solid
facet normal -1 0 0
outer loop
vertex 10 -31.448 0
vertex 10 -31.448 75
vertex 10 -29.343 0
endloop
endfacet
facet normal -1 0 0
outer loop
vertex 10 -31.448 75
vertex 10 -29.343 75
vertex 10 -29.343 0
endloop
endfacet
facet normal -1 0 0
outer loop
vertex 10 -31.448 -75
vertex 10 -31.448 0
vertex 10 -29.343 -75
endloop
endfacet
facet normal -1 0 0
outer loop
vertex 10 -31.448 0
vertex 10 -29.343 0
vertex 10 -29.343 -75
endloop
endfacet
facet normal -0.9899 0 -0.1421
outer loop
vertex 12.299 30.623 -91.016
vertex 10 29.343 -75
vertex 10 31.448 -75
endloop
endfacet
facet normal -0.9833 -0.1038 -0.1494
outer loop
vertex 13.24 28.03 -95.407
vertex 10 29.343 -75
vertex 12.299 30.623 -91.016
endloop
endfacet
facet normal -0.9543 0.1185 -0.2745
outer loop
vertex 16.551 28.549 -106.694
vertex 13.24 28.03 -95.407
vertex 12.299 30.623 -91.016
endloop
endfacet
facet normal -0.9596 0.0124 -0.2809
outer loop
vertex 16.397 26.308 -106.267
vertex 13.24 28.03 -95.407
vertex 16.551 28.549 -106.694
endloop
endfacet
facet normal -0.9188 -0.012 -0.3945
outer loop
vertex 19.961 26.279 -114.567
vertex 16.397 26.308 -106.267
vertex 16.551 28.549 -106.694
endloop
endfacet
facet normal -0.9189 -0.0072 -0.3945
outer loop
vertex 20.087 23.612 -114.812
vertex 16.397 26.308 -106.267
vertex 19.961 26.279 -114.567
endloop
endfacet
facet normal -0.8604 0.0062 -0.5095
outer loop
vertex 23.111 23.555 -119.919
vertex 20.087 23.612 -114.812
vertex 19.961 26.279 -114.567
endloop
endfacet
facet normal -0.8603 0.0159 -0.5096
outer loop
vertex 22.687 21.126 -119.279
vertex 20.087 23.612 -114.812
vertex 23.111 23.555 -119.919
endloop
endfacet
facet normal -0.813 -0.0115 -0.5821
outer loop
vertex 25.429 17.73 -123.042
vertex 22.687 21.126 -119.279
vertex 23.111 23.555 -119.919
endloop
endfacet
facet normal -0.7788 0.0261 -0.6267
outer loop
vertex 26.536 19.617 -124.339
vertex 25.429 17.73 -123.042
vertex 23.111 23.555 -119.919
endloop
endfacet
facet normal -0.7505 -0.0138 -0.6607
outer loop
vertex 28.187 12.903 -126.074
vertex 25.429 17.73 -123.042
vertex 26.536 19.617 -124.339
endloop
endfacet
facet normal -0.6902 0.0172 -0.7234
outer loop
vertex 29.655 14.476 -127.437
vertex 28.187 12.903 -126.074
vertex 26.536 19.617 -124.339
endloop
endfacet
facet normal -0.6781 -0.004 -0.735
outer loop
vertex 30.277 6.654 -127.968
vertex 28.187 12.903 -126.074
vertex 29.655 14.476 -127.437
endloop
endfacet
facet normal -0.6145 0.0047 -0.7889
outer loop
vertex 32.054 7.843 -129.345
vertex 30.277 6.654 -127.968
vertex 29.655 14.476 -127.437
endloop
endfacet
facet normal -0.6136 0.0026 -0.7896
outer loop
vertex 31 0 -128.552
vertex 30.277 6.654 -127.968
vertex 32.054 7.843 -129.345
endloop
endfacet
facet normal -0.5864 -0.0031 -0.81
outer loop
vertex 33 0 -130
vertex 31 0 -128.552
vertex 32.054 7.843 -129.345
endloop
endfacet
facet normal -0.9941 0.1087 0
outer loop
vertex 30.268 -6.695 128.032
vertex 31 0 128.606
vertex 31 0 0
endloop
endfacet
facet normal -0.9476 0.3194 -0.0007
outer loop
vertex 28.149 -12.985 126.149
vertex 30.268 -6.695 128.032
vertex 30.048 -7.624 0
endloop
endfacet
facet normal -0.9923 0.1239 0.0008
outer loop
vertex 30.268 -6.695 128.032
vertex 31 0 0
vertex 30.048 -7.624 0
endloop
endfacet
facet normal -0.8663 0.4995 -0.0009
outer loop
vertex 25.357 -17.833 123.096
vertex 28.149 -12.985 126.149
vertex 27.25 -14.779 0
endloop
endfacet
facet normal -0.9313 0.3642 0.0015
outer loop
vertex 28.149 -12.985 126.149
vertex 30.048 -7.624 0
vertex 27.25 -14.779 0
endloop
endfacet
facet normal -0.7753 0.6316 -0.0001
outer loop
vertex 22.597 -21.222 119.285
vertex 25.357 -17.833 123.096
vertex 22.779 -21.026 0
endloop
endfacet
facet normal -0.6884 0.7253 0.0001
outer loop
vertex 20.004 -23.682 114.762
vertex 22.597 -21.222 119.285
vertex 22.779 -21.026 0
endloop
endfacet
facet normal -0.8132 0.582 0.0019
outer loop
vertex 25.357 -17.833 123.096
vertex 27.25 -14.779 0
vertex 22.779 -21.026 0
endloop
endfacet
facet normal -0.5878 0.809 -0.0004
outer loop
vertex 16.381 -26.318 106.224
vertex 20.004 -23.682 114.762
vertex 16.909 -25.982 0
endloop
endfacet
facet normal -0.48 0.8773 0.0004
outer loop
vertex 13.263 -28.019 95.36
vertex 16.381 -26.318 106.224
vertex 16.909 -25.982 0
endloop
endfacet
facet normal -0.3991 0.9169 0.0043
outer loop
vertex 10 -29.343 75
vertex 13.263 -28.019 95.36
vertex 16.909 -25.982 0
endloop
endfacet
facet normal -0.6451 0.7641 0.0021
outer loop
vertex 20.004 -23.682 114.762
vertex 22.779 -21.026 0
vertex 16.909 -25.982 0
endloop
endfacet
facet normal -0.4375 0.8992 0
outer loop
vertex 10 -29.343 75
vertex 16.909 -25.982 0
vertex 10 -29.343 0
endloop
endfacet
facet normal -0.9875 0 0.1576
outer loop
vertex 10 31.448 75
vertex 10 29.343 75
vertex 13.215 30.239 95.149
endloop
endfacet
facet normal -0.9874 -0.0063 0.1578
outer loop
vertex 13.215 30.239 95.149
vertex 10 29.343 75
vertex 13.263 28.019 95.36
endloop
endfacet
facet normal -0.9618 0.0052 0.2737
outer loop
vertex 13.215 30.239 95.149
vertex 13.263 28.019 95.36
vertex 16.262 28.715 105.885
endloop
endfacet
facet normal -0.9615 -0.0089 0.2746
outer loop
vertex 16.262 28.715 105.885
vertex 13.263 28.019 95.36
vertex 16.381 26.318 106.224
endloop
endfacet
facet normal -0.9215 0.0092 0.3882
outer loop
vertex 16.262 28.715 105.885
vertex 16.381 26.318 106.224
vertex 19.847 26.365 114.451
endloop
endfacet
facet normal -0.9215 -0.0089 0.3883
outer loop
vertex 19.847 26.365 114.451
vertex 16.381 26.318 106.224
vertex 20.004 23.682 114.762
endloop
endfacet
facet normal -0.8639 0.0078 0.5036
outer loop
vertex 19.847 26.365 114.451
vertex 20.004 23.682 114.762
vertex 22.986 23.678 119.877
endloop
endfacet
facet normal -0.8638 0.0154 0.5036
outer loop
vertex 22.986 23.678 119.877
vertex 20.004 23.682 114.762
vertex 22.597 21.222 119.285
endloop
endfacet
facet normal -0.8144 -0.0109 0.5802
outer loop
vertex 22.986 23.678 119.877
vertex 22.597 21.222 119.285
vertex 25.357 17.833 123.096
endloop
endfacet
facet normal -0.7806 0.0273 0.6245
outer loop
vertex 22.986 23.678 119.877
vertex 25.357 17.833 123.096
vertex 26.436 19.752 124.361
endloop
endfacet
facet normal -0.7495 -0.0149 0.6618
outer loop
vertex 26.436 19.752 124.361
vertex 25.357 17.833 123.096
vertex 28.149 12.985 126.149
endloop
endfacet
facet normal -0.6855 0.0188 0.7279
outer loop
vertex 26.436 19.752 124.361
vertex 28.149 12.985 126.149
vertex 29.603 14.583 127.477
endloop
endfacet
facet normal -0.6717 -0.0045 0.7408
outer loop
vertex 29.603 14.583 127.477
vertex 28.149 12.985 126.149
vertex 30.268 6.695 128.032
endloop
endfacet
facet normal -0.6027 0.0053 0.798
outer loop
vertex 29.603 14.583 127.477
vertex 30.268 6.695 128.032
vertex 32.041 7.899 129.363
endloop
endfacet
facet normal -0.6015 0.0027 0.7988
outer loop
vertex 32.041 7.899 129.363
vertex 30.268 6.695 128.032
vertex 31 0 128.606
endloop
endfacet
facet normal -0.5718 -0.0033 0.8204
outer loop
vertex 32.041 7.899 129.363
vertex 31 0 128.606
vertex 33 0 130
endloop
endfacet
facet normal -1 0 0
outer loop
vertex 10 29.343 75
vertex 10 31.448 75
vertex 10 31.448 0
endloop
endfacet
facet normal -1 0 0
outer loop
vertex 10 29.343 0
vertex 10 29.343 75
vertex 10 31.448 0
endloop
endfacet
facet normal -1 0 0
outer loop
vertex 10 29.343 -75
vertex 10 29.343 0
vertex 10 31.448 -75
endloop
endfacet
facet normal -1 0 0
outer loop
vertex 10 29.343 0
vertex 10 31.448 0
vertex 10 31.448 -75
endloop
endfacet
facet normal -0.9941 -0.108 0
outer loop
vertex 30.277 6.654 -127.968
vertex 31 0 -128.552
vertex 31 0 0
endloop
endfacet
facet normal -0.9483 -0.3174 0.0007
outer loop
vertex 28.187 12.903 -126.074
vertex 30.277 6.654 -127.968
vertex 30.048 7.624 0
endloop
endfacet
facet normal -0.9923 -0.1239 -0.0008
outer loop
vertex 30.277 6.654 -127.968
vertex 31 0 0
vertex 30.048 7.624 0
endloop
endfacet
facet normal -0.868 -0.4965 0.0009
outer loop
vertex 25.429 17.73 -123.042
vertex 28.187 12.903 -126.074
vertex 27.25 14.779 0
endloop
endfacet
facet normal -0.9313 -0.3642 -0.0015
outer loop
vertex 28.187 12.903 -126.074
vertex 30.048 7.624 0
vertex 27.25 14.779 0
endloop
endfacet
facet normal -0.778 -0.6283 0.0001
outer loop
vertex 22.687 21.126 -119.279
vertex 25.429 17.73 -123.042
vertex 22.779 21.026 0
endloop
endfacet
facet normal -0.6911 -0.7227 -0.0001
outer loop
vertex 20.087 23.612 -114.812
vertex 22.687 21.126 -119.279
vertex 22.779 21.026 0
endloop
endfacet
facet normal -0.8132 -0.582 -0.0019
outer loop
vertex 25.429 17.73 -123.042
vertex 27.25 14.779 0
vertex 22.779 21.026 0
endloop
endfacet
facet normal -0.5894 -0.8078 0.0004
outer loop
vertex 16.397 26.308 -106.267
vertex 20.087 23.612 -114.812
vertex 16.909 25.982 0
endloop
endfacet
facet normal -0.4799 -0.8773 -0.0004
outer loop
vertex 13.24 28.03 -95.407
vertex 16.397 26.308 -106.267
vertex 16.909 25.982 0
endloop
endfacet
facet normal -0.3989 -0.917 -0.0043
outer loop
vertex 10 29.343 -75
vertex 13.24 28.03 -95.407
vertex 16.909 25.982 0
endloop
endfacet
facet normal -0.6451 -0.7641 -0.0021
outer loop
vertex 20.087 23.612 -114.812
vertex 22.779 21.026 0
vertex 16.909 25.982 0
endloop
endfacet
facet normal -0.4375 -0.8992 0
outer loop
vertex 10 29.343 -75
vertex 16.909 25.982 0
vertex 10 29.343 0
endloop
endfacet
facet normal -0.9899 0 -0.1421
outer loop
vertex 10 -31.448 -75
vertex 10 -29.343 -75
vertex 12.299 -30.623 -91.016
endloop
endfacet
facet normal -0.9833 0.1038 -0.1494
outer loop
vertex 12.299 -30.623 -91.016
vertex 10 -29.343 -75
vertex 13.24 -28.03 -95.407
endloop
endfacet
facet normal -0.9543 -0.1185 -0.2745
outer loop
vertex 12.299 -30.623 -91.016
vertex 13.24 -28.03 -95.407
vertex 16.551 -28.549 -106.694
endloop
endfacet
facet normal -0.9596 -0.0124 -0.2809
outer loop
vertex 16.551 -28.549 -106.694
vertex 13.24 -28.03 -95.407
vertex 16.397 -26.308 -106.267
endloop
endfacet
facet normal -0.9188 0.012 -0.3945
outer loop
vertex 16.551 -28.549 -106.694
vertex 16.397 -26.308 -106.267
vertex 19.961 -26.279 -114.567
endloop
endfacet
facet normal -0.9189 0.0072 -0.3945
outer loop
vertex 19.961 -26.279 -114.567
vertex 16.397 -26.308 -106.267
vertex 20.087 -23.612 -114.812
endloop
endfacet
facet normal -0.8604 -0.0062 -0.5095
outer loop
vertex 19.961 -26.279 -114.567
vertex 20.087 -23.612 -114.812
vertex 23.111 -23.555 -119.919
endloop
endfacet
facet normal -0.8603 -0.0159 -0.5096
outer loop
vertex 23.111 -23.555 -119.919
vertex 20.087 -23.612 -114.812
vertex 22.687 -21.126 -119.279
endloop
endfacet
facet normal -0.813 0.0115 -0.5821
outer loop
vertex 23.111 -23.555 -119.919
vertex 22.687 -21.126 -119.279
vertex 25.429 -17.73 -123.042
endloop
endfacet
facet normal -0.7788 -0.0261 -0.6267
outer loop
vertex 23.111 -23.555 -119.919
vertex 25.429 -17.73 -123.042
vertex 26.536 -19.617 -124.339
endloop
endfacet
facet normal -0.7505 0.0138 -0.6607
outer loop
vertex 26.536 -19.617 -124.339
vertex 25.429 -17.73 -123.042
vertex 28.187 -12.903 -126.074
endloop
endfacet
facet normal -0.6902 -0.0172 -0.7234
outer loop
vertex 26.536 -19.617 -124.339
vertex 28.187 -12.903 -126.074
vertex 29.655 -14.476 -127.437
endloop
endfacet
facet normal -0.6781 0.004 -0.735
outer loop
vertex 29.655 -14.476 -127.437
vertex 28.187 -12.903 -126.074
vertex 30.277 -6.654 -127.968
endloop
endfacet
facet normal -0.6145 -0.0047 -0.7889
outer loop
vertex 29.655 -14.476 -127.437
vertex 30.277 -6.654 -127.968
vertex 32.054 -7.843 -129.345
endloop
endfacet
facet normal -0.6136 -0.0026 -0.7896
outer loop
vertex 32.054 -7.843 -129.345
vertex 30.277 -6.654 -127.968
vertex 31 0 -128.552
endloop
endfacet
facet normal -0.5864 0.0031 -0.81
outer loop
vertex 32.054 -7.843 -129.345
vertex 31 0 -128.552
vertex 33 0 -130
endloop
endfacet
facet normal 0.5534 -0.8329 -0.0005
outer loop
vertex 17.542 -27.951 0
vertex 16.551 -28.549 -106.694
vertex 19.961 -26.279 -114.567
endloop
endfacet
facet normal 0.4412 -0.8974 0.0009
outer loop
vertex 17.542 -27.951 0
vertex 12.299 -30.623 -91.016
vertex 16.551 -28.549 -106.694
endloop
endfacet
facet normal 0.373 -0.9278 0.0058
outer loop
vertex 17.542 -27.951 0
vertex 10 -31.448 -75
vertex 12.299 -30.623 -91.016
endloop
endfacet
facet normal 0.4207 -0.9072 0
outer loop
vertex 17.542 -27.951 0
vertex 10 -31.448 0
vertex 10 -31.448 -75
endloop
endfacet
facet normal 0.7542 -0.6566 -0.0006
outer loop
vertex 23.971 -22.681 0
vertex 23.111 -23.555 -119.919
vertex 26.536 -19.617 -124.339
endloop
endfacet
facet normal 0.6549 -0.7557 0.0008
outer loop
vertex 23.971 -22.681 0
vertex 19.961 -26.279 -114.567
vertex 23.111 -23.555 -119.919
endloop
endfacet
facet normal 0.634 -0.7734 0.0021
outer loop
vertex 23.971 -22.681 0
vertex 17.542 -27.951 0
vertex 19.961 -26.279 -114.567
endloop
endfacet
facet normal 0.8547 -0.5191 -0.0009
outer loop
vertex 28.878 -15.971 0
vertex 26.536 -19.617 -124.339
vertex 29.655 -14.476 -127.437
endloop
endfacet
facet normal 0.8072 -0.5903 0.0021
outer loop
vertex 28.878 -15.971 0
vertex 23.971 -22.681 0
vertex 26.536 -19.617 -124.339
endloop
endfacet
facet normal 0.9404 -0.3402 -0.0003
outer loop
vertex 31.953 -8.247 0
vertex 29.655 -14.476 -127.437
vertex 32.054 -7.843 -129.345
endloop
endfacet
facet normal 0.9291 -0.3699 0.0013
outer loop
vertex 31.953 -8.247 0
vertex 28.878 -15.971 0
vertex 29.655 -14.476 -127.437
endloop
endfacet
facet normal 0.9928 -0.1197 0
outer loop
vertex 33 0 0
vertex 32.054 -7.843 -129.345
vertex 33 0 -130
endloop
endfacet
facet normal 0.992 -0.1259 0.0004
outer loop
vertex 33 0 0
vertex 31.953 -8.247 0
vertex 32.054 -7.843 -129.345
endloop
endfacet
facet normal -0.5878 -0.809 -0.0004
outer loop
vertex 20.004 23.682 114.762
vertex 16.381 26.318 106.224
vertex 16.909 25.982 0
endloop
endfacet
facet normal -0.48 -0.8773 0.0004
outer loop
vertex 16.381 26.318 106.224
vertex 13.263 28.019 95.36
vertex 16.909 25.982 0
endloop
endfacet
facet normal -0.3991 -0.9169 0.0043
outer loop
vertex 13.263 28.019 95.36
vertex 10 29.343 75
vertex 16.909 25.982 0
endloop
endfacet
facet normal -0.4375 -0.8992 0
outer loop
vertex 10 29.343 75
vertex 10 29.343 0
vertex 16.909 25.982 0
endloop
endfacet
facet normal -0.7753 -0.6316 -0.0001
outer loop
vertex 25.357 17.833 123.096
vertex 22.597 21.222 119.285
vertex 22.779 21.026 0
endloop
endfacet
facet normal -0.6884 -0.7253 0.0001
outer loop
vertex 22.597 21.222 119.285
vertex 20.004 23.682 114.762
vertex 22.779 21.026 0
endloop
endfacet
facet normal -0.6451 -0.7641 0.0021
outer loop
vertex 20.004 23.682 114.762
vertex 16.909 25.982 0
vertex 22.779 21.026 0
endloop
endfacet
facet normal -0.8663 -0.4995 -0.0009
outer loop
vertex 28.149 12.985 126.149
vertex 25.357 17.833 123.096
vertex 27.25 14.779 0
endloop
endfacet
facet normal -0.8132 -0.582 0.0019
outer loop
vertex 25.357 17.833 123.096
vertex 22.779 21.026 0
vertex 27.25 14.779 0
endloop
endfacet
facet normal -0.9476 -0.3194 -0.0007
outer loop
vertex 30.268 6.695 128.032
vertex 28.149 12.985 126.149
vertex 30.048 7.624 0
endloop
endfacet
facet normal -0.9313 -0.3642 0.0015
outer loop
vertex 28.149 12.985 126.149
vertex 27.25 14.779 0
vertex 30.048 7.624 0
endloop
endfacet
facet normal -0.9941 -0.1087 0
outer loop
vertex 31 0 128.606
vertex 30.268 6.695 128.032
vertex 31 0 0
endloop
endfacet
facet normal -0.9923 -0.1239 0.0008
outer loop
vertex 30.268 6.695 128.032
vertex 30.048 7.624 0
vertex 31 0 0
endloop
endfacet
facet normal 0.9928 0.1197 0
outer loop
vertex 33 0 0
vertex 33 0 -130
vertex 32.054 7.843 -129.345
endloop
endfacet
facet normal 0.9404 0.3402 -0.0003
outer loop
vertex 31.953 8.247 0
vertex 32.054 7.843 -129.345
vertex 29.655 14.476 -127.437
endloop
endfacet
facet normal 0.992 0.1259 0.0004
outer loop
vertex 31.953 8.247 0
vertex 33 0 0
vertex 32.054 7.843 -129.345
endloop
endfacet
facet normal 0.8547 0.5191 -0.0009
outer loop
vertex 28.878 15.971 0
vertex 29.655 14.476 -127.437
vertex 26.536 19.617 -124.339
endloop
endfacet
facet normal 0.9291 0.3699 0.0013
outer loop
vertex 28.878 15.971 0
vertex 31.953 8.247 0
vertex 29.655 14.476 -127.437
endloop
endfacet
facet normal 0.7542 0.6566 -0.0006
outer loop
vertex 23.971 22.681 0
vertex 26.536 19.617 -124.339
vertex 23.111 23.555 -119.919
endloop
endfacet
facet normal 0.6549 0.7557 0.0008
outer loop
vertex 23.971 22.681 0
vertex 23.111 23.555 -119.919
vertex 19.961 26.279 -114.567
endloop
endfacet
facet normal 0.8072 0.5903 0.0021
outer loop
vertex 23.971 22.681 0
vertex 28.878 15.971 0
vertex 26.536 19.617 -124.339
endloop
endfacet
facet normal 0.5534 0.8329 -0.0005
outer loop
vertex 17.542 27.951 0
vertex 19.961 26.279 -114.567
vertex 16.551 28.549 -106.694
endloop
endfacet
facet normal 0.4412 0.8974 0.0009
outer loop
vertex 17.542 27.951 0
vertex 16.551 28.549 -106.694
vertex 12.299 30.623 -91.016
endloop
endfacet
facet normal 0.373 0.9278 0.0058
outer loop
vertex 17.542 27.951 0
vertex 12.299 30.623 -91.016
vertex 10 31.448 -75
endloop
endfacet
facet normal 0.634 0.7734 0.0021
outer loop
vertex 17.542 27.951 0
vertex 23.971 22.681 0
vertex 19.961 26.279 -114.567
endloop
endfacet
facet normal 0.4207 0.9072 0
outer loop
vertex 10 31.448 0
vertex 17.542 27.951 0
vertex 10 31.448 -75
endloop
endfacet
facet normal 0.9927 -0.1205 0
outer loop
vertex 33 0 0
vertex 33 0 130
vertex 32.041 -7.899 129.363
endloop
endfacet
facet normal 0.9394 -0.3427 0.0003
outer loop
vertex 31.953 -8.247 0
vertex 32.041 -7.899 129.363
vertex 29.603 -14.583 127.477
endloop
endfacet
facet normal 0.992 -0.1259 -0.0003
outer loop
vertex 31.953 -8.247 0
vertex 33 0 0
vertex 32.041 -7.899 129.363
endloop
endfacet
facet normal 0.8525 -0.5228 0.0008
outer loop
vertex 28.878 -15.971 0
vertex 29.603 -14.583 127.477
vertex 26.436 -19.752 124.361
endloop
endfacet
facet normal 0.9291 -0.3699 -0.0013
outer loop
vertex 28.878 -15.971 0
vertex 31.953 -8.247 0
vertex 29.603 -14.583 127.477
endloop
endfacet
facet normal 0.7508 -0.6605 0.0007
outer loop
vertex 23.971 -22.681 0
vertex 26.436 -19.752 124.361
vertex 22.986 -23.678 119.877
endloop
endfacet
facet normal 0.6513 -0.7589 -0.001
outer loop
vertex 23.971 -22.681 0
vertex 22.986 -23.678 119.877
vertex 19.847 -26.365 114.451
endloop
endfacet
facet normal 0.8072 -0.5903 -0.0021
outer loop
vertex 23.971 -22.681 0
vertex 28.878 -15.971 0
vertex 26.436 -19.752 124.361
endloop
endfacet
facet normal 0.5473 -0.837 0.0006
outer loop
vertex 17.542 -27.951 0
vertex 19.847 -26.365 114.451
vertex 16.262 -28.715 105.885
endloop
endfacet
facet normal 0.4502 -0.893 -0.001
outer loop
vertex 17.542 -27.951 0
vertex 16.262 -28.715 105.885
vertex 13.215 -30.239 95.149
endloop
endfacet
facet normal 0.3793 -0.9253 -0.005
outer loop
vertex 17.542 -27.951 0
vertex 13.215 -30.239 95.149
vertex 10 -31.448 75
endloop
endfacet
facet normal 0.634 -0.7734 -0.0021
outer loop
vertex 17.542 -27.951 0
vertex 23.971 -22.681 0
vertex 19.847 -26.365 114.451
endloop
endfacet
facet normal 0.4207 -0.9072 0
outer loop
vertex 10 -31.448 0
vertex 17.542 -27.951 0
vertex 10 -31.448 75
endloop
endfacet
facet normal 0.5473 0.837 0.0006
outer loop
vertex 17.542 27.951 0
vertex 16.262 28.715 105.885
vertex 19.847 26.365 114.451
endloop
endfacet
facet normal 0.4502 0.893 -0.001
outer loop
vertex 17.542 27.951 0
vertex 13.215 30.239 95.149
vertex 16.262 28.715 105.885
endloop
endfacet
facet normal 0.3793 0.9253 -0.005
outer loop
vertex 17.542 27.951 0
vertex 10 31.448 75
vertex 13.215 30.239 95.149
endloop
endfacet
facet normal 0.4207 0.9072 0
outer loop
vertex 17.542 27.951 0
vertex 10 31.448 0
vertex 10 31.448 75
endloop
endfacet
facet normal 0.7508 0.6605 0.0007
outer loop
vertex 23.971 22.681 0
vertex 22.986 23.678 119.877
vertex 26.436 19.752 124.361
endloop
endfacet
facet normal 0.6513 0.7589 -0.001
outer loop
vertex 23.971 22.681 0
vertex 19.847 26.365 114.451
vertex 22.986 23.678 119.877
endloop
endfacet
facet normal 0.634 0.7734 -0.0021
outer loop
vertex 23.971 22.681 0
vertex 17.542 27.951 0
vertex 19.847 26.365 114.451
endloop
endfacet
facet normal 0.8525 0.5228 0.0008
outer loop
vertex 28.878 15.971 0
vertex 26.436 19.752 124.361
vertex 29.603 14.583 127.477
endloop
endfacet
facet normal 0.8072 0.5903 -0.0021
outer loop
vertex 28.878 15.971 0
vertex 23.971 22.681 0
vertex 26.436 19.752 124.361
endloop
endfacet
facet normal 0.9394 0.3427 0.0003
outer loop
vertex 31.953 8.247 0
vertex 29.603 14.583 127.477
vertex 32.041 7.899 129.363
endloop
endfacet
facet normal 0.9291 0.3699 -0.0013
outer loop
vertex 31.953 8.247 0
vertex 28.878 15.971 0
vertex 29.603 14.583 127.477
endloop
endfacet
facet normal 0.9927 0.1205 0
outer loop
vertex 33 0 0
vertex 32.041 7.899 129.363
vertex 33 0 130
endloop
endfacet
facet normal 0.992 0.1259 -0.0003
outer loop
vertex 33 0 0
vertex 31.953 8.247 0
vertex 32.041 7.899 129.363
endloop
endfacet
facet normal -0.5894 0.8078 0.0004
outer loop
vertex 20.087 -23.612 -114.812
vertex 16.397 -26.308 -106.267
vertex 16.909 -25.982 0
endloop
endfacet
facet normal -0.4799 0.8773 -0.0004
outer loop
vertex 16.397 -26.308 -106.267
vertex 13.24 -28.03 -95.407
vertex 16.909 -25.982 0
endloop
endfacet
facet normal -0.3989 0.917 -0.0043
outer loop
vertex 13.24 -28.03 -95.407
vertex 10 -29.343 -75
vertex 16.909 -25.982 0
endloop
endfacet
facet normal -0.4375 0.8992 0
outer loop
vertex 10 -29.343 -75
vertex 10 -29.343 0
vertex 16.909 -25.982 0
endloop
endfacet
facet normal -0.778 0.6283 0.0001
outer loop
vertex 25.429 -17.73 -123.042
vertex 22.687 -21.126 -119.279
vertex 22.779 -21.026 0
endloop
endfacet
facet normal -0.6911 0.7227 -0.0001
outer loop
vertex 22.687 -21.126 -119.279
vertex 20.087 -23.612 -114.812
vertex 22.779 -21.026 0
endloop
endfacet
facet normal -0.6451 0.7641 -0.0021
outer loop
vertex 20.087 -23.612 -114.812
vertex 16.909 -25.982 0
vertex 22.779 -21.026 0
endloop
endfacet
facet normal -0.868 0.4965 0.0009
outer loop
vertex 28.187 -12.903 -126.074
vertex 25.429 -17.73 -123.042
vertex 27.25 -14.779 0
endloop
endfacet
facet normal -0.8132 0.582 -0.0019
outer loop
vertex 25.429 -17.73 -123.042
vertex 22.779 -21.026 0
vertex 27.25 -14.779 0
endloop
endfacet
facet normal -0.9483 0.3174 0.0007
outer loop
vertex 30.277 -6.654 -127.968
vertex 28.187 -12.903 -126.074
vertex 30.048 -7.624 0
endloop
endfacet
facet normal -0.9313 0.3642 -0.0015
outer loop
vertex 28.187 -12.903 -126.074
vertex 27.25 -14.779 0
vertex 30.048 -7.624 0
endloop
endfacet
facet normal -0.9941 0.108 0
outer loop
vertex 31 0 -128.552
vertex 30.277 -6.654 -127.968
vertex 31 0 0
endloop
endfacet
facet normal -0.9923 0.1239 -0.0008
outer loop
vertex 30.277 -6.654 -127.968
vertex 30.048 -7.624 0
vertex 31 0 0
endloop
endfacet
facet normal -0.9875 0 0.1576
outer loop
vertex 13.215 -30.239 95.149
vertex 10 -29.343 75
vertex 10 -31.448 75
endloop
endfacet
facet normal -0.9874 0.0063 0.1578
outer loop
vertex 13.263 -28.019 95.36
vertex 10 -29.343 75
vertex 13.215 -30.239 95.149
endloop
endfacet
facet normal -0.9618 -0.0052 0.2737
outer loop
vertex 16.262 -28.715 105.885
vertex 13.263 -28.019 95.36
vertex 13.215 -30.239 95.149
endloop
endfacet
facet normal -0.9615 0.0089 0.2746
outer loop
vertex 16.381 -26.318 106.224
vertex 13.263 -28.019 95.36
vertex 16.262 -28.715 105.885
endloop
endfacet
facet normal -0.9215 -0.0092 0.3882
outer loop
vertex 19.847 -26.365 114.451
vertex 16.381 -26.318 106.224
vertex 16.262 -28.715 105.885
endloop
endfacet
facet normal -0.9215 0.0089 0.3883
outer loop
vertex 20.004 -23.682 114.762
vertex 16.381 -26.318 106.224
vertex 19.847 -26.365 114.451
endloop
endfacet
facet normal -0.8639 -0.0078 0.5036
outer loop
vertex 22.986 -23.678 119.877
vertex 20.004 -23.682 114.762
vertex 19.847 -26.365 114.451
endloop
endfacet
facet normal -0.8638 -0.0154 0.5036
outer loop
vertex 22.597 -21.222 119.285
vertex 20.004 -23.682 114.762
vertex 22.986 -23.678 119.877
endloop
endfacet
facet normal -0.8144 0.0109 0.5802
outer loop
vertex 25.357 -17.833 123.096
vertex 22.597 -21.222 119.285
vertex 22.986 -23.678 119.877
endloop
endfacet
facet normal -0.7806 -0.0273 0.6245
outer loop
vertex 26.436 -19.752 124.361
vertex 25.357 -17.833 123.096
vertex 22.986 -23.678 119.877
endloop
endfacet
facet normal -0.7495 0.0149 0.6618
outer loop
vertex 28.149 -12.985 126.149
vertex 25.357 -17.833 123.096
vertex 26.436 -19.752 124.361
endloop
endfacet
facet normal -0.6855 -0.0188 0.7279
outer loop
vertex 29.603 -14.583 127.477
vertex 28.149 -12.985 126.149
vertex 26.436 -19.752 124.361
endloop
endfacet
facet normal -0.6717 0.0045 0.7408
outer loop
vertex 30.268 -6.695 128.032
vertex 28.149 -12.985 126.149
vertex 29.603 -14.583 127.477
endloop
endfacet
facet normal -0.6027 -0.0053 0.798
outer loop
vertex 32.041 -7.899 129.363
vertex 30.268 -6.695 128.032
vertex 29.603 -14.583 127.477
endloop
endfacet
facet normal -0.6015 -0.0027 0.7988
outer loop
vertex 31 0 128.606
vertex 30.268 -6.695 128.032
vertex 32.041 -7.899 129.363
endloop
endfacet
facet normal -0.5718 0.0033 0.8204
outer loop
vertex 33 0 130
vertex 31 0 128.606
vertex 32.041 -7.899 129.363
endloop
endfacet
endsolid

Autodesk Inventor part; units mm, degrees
ref_plane "YZ Plane" through (0, 0, 0) normal (1, 0, 0) x (0, 1, 0)
ref_plane "XZ Plane" through (0, 0, 0) normal (0, 1, 0) x (-1, 0, 0)
ref_plane "XY Plane" through (0, 0, 0) normal (0, 0, 1) x (1, 0, 0)
sketch "Skizze1" plane through (0, 0, 0) normal (0, 0, 1) x (1, 0, 0)
  circle A0 centre (0, 0) radius 33
  circle A1 centre (0, 0) radius 31
  dimension "d0" = 66
  dimension "d1" = 62
extrude "Extrusion1" add sketch "Skizze1" along normal mid plane 300
sketch "Skizze2" plane through (0, 0, 0) normal (0, 1, 0) x (-1, 0, 0)
  line L0 (-10, 169.5773) -> (-10, -169.8146) construction
  line L1 (-74.8376, 0) -> (82.6362, 0) construction
  line L2 (-10, 75) -> (-10, -75)
  line L3 (-33, -150) -> (-33, 150) projected
  line L4 (33, 150) -> (-33, 150) projected
  line L5 (-33, -150) -> (33, -150) projected
  spline S0 degree 2 poles (-10, 75) (-18.0478, 153.5197) (-72.8449, 128.3193) knots 0 0 0 1 1 1
  spline S1 degree 2 poles (-10, -75) (-17.6631, -153.0376) (-74.8376, -130) knots 0 0 0 1 1 1
  line L6 (33, -150) -> (-33, -150)
  line L7 (33, -150) -> (33, 150)
  line L8 (33, -150) -> (33, 150) projected
  line L9 (33, 150) -> (-33, 150)
  line L10 (-33, 150) -> (-33, 130)
  line L11 (-33, -150) -> (-33, 150) projected
  line L12 (33, -150) -> (-33, -150)
  point P0 (0, 0)
  point P1 (-33, -130)
  dimension "d4" = 10
  dimension "d5" = 150
  dimension "d6" = 20
  dimension "d7" = 20
extrude "Extrusion3" cut sketch "Skizze2" against normal mid plane 70 contours S0 L3 L4 L7 L5 S1 L2
properties part number "Segment_Deckel"
